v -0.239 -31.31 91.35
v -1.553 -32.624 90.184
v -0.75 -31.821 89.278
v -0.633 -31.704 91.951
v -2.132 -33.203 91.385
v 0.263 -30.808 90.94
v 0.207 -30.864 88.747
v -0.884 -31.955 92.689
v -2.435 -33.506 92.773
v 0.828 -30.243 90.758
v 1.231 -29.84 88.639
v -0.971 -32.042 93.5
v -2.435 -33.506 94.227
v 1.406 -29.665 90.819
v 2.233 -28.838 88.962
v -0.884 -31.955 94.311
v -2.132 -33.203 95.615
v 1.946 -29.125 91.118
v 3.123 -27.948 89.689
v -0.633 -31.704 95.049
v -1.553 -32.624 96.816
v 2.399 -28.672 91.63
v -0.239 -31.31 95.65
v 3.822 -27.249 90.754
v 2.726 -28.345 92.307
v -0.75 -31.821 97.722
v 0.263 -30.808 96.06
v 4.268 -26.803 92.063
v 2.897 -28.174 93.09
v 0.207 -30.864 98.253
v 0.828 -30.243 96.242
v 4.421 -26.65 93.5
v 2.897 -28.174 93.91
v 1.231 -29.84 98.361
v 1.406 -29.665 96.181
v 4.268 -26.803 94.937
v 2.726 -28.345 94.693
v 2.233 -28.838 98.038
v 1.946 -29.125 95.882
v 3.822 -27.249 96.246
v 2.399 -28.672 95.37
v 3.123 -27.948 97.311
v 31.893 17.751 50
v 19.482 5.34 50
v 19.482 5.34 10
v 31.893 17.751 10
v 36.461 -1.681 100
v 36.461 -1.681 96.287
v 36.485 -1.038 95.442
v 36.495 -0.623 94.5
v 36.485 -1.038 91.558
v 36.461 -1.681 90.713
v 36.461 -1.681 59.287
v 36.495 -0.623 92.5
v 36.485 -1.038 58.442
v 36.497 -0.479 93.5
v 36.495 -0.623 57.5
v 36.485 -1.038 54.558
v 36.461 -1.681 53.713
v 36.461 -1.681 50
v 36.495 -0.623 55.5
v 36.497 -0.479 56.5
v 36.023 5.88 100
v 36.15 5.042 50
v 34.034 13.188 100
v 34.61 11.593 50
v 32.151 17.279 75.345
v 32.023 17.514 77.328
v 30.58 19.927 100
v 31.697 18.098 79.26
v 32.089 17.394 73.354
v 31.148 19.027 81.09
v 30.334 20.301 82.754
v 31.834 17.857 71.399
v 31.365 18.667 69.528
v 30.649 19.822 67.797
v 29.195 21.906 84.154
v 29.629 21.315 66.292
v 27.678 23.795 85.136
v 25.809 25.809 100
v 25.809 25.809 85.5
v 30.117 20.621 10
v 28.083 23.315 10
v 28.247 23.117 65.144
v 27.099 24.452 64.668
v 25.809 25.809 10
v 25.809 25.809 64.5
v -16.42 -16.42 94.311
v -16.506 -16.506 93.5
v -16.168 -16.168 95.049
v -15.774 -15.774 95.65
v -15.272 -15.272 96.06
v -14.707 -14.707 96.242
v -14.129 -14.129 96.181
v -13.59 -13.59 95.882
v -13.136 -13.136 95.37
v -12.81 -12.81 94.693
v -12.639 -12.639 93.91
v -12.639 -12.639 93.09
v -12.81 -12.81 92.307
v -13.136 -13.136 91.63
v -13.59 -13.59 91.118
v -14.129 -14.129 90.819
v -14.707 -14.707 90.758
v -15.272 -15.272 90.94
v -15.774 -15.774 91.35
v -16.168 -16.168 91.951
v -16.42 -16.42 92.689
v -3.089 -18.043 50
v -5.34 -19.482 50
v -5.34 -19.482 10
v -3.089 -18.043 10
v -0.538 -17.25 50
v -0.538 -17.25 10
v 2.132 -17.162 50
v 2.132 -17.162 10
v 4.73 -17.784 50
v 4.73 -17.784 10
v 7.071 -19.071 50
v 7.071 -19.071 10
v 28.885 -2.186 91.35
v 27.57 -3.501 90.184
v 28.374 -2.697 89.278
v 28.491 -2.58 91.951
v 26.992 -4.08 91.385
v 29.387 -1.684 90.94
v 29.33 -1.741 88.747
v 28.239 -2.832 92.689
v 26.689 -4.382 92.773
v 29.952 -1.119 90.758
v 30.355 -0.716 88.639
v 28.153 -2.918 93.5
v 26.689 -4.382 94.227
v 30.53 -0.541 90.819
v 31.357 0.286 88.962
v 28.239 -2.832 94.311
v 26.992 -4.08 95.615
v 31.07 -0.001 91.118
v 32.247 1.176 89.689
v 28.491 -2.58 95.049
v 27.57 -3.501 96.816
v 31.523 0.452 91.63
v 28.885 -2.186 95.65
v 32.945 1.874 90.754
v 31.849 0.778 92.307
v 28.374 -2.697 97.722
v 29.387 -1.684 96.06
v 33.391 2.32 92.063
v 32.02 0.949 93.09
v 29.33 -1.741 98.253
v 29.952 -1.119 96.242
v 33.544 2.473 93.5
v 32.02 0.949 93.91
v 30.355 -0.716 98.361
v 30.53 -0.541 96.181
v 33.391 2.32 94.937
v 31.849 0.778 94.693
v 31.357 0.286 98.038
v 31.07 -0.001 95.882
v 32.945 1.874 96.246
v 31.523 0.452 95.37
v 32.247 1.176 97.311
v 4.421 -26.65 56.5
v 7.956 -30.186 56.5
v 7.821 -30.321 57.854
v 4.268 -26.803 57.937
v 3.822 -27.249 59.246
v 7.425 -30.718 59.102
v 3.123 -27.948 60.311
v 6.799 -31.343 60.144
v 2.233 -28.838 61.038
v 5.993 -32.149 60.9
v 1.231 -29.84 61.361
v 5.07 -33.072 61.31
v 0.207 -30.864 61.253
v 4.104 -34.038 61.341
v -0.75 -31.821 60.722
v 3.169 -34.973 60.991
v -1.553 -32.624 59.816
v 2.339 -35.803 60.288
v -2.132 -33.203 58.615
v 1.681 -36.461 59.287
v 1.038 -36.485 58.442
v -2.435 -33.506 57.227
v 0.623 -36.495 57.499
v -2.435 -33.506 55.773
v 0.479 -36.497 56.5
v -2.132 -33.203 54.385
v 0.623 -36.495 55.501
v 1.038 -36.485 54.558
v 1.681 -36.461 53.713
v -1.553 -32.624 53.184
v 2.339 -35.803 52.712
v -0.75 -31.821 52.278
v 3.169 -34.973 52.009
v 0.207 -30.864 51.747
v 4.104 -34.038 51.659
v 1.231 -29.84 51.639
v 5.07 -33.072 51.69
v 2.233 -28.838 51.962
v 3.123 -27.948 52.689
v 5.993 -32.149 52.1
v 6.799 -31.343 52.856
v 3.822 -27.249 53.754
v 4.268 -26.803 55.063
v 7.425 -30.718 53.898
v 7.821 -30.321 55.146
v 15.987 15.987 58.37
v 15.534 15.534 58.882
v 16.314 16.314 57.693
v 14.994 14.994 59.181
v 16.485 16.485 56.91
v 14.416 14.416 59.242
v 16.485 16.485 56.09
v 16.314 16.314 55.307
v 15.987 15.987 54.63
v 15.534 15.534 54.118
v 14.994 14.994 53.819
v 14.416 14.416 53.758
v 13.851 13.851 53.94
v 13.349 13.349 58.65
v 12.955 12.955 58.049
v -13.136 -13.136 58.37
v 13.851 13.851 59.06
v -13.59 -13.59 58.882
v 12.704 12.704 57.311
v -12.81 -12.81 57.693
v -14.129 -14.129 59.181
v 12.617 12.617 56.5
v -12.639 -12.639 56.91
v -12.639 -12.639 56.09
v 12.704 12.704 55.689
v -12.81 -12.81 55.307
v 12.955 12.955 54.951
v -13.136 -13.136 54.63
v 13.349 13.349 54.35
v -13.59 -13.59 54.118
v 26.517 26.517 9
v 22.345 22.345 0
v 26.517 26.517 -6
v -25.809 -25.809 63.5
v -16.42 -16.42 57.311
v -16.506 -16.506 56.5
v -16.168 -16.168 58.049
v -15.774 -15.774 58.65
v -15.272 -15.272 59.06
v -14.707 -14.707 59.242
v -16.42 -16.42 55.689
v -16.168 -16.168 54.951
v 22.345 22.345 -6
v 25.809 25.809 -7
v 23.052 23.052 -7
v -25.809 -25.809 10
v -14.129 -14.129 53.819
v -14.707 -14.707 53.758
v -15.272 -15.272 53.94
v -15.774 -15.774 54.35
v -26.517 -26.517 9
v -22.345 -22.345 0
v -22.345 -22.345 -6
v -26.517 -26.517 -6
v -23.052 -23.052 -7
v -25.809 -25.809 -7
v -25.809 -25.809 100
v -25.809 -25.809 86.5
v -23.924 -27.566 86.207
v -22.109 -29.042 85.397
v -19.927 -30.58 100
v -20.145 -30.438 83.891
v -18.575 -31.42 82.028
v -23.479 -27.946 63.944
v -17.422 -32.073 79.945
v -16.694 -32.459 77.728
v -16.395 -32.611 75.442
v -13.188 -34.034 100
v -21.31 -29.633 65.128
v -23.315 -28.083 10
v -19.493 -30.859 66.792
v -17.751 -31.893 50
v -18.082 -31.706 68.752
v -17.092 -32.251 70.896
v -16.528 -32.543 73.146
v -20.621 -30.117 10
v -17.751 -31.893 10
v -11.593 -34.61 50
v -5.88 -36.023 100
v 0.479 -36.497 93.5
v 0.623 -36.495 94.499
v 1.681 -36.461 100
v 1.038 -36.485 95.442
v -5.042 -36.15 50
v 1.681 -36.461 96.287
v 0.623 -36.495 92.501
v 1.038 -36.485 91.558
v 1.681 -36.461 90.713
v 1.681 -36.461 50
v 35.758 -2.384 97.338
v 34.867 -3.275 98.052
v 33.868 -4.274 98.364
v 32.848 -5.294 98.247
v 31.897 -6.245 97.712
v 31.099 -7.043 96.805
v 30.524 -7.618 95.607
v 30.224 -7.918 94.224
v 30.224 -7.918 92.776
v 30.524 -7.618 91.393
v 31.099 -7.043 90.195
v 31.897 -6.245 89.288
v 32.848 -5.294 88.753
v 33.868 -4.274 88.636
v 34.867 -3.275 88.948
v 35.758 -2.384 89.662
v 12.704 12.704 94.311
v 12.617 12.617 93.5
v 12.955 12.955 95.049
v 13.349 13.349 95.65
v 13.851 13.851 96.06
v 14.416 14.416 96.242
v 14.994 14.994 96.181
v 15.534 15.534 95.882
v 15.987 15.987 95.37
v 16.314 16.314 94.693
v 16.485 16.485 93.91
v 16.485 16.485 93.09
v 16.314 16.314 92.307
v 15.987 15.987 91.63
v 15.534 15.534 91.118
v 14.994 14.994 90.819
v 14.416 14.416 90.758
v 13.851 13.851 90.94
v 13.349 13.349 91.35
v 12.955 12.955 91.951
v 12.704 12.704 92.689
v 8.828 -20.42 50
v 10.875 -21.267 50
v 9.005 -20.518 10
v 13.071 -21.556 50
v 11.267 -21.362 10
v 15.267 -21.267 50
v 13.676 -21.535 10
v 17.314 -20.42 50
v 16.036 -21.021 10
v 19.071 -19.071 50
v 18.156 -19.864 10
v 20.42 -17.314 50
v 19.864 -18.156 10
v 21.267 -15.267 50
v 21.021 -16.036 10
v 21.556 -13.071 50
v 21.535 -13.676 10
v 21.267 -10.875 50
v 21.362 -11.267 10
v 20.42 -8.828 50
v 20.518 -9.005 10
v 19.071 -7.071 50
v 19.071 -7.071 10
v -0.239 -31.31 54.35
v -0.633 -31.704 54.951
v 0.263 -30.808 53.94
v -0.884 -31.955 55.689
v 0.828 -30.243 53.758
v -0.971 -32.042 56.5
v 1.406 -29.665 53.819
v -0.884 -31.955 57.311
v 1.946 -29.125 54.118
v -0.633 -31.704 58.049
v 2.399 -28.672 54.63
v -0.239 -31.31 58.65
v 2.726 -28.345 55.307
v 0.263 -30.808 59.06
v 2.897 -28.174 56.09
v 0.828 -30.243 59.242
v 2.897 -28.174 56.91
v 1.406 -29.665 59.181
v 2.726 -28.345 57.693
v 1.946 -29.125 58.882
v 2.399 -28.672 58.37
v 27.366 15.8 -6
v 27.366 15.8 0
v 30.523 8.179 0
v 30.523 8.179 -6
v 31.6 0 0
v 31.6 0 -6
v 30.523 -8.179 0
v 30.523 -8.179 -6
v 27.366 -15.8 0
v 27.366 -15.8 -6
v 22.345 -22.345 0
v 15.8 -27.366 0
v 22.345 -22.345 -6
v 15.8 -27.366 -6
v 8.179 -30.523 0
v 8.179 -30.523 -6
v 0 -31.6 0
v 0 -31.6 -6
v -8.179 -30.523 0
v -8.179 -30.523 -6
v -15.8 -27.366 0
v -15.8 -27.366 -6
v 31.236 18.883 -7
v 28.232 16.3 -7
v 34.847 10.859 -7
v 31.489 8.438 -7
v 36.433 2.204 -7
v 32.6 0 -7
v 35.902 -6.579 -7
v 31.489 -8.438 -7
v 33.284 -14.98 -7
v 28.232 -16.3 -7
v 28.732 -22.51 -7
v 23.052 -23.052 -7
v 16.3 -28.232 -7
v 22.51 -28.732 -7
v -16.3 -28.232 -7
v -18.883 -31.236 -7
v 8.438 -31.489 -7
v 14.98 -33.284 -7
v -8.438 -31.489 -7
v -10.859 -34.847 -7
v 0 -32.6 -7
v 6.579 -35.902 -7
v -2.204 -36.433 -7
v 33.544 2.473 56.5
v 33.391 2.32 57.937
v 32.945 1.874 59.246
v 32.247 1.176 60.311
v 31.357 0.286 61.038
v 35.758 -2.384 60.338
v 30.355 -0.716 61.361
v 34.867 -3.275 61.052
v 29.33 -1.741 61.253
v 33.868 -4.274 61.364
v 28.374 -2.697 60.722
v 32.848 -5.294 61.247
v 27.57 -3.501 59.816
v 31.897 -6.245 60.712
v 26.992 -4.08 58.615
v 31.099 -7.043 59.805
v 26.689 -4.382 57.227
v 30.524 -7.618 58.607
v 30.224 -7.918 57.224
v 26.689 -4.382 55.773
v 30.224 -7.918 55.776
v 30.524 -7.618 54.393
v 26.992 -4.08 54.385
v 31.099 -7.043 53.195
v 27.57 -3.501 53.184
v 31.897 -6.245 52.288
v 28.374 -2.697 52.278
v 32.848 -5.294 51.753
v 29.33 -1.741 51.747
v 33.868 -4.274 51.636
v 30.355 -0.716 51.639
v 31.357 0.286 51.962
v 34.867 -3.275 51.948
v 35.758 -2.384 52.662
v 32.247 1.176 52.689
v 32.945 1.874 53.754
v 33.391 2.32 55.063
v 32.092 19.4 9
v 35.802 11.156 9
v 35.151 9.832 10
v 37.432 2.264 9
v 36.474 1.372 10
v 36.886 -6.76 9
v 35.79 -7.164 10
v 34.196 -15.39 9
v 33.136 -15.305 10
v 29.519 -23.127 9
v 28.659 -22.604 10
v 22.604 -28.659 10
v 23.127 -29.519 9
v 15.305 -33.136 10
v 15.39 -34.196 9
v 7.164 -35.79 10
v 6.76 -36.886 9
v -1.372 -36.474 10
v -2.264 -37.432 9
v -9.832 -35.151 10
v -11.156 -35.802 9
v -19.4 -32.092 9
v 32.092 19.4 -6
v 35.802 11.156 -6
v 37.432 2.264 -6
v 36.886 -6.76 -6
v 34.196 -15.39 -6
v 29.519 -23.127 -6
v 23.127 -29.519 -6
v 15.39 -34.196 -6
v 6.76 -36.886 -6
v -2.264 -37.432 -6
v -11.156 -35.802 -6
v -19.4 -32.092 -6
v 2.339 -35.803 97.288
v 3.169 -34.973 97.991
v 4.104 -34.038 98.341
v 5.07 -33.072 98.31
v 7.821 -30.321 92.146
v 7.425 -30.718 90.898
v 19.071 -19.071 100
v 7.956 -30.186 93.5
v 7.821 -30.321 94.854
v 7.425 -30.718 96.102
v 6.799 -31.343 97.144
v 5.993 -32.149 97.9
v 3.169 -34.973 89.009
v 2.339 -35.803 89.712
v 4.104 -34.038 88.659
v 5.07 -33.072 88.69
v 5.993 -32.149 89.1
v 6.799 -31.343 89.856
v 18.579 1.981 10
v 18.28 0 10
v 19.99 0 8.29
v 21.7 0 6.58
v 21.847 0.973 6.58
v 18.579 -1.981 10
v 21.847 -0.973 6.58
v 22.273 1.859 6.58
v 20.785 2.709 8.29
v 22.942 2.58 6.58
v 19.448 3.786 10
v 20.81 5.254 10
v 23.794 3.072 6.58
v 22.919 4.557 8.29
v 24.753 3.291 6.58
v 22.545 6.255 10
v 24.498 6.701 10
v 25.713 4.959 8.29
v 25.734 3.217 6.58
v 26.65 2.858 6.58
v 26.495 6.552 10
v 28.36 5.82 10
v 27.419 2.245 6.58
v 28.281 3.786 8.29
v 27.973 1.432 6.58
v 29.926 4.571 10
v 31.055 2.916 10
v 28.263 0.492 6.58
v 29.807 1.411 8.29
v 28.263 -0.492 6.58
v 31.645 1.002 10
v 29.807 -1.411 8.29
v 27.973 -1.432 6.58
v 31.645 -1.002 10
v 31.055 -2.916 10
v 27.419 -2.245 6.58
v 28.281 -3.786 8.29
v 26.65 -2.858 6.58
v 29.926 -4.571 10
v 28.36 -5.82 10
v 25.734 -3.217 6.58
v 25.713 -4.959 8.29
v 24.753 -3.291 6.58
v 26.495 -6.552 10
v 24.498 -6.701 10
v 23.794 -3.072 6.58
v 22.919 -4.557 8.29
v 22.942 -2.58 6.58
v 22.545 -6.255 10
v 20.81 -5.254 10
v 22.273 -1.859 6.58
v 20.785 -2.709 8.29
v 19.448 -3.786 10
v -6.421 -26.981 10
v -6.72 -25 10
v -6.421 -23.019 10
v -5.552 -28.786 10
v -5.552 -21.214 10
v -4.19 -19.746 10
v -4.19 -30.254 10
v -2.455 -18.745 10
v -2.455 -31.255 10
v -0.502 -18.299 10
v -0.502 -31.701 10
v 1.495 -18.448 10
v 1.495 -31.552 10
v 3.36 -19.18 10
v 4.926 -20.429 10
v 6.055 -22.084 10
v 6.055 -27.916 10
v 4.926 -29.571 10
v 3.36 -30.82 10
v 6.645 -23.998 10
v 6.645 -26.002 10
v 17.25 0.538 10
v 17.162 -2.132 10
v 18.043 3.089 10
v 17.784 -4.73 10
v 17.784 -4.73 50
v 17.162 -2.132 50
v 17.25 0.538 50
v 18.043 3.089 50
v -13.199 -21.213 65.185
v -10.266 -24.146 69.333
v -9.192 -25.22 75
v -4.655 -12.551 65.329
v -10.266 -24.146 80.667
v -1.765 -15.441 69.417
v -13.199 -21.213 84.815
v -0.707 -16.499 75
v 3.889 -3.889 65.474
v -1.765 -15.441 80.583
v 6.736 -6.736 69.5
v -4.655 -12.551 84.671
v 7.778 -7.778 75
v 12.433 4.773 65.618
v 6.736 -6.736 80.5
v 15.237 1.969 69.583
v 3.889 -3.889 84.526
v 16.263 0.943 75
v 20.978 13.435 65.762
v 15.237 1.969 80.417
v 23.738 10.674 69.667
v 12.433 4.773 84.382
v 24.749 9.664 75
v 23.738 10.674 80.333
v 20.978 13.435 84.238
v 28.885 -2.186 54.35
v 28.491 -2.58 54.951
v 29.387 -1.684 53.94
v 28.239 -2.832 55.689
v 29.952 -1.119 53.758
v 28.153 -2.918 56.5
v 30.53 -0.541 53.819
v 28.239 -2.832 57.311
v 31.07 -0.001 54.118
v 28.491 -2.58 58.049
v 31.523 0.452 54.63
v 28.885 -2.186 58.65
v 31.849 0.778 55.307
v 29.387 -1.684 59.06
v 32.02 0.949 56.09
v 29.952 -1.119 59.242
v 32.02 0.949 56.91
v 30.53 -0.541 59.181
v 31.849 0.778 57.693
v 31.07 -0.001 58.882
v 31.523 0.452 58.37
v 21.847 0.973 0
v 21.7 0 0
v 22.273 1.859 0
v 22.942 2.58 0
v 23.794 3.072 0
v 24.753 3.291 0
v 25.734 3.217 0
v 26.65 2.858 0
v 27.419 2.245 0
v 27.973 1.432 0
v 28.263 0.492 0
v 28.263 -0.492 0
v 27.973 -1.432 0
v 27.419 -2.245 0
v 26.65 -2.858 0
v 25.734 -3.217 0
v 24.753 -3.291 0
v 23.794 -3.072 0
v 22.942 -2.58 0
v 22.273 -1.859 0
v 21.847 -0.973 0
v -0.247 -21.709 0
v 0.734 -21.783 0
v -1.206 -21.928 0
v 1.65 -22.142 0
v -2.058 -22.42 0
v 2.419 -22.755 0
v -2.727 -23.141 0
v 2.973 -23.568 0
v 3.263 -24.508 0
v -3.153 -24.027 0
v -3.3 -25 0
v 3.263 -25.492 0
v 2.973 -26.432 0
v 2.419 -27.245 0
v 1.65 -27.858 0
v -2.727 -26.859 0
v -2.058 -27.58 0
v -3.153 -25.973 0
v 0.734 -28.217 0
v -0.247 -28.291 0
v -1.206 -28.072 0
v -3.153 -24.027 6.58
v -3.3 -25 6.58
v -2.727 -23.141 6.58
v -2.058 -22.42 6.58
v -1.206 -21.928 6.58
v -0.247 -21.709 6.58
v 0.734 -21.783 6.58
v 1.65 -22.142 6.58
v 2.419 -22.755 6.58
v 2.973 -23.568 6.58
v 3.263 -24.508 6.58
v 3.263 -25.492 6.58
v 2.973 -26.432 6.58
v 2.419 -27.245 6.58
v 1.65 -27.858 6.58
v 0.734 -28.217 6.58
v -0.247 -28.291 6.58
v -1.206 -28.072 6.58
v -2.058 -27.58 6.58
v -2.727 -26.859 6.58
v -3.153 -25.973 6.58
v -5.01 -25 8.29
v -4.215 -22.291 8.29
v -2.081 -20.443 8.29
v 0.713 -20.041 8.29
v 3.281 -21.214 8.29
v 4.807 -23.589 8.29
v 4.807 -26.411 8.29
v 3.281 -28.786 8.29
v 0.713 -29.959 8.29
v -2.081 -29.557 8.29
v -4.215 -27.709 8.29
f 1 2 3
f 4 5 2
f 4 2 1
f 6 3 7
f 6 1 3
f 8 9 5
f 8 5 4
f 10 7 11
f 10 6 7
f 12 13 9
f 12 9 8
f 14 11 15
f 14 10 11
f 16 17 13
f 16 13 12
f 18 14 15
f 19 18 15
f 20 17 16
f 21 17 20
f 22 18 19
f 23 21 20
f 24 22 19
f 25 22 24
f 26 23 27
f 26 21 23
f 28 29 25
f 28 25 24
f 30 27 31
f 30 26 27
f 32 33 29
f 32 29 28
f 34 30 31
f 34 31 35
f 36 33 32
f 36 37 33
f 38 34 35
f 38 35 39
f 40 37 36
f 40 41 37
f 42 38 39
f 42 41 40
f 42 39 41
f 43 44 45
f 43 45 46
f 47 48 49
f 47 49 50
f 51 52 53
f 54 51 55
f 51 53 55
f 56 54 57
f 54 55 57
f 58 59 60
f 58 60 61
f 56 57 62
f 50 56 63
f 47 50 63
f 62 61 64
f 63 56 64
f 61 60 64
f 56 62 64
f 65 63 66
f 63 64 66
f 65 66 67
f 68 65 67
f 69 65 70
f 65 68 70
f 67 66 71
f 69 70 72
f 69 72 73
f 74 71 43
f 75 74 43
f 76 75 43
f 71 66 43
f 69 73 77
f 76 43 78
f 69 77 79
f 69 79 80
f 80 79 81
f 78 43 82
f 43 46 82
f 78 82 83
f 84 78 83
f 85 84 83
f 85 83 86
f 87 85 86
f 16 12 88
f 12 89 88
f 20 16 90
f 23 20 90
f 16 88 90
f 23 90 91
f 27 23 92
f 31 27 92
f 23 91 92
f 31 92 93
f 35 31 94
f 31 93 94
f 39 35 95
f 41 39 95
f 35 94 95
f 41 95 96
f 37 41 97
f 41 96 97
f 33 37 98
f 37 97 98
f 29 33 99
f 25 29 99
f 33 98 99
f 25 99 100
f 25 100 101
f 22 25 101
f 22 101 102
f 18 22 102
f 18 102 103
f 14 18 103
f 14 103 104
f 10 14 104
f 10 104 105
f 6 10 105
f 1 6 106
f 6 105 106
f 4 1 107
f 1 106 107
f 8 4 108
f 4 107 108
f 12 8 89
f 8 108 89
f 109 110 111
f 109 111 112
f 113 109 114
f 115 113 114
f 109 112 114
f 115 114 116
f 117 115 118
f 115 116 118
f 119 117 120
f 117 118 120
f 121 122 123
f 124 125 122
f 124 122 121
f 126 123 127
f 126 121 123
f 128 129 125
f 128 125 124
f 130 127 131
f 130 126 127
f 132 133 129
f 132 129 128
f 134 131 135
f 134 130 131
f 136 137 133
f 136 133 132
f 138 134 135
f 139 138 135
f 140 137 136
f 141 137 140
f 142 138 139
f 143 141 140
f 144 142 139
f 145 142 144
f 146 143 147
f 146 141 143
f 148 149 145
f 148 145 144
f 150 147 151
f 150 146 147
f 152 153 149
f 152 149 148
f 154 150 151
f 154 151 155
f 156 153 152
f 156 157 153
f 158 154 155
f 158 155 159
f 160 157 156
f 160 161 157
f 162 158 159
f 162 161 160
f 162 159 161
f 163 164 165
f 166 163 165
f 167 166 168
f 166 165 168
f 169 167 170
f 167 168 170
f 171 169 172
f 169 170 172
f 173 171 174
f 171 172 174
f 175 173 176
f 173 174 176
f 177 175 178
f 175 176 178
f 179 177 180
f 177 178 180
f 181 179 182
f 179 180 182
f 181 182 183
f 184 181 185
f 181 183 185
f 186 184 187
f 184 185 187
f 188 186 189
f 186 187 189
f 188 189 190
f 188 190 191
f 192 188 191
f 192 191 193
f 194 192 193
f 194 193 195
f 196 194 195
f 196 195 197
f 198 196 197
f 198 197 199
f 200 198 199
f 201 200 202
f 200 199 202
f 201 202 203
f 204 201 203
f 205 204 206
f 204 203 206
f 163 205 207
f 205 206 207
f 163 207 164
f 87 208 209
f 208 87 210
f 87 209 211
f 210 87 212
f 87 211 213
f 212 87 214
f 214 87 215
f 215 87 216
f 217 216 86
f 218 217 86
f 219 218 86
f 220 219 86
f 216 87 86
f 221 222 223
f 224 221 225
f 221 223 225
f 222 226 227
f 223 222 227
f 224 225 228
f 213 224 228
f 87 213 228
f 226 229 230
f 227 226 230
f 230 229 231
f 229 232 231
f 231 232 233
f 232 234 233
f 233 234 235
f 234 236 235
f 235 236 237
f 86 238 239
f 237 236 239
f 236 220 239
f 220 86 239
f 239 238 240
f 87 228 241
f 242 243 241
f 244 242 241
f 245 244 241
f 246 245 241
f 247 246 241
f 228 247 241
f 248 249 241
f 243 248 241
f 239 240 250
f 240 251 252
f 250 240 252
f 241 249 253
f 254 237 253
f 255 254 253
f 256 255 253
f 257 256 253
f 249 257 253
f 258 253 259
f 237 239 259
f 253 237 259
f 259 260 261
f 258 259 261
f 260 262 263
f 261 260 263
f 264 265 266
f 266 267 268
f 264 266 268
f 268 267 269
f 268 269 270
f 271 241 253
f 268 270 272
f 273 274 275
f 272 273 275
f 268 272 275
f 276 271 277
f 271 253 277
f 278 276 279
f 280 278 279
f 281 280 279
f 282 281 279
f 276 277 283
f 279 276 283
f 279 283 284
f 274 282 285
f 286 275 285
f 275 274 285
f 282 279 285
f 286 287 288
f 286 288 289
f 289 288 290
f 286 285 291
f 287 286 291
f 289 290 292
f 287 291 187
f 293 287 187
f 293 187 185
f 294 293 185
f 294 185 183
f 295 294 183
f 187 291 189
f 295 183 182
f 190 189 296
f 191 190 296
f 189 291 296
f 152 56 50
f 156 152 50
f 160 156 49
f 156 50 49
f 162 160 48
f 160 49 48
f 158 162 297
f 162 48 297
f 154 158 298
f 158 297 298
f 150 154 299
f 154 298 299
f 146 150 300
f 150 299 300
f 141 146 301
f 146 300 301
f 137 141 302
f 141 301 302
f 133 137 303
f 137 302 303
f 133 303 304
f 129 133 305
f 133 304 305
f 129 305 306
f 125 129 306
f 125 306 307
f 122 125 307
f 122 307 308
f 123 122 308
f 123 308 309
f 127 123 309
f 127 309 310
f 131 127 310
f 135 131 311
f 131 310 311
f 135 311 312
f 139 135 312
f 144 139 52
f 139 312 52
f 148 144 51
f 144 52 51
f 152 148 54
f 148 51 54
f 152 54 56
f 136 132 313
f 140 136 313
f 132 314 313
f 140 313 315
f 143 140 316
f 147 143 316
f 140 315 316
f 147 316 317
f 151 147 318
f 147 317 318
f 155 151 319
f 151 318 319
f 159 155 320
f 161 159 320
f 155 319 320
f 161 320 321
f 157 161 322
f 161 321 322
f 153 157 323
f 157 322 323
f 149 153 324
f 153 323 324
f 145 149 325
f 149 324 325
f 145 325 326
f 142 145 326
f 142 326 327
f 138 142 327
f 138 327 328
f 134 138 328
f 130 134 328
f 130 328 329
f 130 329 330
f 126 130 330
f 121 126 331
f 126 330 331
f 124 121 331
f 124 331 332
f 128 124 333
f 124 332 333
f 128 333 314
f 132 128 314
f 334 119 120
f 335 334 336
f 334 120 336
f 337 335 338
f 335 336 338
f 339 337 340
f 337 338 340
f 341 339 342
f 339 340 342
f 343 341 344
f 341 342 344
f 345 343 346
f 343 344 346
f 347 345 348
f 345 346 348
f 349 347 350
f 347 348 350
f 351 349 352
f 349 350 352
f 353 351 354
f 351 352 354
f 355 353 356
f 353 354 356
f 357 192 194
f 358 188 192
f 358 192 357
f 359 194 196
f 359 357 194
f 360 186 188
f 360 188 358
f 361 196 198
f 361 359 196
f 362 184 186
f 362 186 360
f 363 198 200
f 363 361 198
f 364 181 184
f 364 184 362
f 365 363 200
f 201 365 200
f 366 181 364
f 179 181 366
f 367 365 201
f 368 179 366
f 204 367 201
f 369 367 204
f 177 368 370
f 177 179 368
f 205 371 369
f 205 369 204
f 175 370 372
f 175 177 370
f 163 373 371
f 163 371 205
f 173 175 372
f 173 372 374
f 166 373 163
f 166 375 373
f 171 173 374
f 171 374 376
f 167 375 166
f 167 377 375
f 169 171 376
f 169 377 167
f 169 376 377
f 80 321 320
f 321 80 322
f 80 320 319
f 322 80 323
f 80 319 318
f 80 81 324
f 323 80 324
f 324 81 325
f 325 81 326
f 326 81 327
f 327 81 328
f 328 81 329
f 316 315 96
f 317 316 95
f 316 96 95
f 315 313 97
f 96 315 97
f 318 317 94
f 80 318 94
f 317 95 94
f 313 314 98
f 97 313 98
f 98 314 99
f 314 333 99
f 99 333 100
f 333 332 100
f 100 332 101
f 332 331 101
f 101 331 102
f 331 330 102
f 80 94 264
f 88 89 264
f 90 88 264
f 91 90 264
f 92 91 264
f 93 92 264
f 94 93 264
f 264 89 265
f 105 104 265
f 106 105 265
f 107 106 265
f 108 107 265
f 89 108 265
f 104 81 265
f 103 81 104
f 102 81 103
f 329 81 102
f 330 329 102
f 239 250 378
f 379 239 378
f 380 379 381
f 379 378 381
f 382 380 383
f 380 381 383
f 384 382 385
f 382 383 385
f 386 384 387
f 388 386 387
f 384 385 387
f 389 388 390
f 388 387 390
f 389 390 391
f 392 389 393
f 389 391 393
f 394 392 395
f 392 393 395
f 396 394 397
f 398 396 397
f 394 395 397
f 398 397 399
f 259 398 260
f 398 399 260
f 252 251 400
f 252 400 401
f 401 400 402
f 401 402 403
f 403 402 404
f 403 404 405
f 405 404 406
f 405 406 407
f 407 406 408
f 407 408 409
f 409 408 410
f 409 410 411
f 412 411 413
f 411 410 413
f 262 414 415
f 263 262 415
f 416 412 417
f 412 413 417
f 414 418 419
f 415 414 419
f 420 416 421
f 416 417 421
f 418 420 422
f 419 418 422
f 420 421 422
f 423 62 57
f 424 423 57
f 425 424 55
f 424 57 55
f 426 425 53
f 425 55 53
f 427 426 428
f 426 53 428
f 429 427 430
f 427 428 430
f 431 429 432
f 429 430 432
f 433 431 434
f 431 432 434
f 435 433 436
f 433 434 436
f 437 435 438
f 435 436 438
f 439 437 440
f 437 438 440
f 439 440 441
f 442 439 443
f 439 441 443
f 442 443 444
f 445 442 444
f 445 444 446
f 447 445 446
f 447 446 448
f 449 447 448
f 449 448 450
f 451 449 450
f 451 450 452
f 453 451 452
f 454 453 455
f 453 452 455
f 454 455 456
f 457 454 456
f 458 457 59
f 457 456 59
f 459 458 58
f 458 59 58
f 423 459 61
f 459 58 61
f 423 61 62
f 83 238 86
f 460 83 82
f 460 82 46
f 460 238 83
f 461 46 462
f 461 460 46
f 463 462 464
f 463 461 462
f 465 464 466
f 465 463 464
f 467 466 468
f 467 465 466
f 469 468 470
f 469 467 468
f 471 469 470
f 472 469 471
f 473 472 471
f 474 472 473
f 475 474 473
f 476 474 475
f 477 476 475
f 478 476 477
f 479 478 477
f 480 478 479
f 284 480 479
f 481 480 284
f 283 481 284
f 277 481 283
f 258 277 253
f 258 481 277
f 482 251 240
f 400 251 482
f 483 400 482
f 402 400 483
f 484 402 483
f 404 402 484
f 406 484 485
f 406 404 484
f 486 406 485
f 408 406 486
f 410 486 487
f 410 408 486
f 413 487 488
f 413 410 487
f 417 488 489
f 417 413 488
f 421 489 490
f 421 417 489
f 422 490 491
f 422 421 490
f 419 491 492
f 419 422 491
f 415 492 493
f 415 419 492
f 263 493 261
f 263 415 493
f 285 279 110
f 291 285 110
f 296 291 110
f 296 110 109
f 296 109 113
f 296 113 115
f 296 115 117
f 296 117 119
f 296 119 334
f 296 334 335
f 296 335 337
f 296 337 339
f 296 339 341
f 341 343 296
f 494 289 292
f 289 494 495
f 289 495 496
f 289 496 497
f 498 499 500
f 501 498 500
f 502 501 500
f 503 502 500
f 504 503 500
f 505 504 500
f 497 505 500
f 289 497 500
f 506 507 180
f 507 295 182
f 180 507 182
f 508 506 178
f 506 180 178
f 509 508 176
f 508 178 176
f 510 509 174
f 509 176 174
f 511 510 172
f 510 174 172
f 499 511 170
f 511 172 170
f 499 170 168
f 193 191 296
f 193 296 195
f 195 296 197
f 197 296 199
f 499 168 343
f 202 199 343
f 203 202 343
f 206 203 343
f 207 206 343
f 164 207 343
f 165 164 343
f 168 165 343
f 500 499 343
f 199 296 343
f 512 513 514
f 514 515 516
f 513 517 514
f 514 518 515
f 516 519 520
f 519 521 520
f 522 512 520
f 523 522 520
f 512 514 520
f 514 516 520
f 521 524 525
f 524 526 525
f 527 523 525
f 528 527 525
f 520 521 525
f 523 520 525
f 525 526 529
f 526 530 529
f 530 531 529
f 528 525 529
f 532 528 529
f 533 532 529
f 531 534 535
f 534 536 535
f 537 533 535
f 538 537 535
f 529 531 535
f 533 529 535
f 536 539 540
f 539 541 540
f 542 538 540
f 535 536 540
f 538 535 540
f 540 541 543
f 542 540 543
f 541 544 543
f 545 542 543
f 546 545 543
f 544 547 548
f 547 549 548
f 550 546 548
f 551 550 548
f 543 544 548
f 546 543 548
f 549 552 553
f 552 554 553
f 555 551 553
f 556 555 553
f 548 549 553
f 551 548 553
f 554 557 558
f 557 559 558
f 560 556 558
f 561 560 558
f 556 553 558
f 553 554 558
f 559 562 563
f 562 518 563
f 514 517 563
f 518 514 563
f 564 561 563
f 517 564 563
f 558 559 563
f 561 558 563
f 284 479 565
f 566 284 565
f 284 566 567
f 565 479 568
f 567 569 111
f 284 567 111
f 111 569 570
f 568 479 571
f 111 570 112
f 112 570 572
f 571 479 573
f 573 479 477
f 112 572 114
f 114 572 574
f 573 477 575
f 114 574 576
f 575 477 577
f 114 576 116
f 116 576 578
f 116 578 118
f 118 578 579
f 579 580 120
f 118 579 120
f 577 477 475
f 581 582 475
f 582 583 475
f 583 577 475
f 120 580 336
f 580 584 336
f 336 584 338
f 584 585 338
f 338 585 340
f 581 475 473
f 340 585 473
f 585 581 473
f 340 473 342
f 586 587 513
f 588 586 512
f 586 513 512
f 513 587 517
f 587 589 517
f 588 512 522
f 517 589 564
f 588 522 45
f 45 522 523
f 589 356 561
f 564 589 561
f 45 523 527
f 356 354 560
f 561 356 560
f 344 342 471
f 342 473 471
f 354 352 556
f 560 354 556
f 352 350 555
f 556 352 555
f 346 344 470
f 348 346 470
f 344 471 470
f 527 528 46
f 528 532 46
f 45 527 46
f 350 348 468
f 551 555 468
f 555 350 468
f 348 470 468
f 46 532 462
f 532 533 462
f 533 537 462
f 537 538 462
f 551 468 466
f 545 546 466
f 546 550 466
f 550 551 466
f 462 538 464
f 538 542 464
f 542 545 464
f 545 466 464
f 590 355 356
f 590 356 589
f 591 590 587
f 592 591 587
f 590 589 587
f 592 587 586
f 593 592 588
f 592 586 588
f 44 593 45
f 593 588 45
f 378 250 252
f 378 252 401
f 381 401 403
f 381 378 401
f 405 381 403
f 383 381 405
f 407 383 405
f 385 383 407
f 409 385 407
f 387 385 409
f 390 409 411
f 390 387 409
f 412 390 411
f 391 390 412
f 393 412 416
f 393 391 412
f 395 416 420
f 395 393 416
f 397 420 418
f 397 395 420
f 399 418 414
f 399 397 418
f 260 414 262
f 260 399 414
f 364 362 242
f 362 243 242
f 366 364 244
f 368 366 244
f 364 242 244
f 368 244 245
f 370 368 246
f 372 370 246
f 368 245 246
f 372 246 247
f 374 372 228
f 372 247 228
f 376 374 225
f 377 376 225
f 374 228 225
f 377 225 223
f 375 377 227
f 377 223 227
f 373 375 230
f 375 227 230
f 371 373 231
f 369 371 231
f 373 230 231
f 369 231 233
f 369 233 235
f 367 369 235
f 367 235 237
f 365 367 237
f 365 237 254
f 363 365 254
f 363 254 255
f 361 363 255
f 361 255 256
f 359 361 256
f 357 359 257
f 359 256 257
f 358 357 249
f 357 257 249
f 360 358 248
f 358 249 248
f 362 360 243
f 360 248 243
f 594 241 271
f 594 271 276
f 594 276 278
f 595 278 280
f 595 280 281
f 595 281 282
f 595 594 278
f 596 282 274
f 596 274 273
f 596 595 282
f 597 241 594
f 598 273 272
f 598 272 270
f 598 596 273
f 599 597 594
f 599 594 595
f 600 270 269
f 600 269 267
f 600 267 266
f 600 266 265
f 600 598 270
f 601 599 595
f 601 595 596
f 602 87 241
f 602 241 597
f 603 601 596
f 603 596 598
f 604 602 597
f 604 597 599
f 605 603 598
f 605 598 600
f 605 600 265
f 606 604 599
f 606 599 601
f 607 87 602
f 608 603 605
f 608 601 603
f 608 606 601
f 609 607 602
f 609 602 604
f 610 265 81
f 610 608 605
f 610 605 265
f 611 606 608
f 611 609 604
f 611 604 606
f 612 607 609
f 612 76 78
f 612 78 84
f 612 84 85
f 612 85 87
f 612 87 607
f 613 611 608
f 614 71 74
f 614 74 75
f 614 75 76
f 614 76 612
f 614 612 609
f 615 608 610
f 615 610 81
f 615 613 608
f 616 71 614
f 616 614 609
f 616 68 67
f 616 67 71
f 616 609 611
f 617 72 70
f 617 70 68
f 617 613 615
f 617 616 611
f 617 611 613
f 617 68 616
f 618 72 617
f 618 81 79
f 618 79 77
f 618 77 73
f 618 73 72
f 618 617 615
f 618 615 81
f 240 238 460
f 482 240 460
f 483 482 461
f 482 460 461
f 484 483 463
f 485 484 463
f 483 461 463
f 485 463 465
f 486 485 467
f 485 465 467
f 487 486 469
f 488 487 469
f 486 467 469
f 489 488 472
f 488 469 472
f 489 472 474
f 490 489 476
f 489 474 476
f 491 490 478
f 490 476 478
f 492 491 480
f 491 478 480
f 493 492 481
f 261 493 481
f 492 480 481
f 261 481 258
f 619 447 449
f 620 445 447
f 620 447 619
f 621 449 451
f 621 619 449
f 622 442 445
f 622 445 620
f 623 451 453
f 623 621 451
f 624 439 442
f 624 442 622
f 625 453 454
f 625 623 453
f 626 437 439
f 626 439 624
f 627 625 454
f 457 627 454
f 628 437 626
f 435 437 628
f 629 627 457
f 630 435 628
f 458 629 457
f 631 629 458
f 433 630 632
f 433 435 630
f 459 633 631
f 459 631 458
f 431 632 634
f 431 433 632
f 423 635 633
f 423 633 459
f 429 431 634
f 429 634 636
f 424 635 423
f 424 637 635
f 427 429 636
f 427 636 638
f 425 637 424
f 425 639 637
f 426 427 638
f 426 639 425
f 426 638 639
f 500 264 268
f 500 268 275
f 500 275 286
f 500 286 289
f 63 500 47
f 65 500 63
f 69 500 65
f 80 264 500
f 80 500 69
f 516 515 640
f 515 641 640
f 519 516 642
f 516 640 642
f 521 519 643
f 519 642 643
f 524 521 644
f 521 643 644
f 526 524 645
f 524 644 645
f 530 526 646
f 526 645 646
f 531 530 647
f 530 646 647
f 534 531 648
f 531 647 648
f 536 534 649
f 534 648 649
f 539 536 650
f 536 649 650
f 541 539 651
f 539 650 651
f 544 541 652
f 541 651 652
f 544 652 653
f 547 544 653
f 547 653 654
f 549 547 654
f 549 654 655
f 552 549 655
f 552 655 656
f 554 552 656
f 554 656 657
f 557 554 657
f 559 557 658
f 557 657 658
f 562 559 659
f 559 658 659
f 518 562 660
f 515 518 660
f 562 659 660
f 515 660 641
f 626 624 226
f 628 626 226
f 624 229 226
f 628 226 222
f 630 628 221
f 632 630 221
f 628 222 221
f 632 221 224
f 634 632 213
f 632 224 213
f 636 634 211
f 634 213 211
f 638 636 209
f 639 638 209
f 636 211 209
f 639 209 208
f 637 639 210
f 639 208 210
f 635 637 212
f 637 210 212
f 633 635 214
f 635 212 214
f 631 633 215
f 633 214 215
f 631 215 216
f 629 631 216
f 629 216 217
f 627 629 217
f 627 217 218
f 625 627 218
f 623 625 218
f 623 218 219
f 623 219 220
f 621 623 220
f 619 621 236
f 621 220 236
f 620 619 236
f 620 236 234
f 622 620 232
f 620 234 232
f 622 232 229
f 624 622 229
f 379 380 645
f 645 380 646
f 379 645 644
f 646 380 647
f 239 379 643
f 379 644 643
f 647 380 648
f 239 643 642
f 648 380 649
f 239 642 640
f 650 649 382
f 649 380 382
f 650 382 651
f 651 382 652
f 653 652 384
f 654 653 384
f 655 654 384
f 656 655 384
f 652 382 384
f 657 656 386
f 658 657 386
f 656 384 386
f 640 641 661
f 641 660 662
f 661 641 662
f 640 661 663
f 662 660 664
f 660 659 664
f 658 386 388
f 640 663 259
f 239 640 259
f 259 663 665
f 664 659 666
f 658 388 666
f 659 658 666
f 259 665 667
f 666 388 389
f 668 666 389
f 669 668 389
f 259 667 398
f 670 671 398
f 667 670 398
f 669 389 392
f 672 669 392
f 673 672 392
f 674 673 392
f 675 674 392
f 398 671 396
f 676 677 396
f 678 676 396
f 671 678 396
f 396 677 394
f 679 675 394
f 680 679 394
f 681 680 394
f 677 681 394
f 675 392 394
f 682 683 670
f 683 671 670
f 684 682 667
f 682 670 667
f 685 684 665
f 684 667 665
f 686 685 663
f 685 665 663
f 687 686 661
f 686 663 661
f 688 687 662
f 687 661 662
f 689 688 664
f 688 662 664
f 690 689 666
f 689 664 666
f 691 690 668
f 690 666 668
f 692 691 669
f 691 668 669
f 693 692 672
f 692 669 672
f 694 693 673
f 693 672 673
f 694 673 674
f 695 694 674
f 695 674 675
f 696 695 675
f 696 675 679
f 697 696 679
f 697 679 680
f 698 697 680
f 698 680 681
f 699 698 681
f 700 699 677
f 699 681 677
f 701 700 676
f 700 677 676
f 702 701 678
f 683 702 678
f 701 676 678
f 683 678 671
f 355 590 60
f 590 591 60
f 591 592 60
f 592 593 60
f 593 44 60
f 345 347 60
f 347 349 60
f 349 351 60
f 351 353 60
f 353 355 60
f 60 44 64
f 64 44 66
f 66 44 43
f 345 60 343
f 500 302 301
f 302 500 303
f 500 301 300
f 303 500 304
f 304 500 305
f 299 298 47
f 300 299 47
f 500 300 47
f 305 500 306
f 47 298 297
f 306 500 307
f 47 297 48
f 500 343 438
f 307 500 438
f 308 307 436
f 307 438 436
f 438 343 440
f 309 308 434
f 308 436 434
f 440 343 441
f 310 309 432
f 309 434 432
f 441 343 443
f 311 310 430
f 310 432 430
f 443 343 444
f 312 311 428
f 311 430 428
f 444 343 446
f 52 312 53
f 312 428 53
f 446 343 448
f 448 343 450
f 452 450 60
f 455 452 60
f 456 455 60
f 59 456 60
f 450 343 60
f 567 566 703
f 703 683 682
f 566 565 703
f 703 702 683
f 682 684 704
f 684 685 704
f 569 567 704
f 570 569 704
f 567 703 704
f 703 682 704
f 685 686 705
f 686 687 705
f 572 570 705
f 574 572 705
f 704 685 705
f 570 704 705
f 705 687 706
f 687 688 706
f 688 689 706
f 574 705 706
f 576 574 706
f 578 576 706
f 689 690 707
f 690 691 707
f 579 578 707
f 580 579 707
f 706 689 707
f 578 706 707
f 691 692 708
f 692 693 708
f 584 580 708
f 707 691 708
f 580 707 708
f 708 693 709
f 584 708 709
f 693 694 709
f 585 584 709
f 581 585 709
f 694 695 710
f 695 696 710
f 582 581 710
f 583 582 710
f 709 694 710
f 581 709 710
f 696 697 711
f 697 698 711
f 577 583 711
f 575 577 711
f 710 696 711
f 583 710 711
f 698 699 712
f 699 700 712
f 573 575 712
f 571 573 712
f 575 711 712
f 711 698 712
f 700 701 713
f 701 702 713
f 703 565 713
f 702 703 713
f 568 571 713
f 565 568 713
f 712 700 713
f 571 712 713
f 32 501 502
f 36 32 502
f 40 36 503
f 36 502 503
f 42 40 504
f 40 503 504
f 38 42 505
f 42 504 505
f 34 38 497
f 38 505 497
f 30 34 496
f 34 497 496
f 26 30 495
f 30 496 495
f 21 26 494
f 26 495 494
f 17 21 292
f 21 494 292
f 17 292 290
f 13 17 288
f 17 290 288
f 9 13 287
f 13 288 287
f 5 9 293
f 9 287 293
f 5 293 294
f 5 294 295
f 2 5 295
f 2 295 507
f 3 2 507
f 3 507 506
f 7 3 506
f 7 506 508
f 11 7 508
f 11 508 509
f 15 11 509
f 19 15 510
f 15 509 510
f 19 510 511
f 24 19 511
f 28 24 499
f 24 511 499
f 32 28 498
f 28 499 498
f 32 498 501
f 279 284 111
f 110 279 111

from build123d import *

# Parameters (mm, degrees)
F1_ANGLE_BACK   = 45
F1_ANGLE        = 180
F2_SIZE         = 1
F4_D            = 6.6
F4_CSINK_D      = 13.44
F4_CSINK_ANGLE  = 90
F6_DEPTH        = 40
F8_DEPTH        = 50
F12_D           = 5.5
F12_CBORE_D     = 9.75
F12_CBORE_DEPTH = 5


# Not quite as in the source:
# - a feature names something its author has since deleted; it is built from what else it names


with BuildPart() as f1:
    # F0 (on Front) → F1 (revolve)
    with BuildSketch(Plane.XZ, mode=Mode.PRIVATE) as f1_sk:
        Polygon((0, 10), (0, 0), (31.6, 0), (31.6, -7), (37.5, -7), (37.5, 10), align=None)
    revolve(f1_sk.sketch.rotate(Axis((0, 0, 5), (0, 0, -1)), -F1_ANGLE_BACK), axis=Axis((0, 0, 5), (0, 0, -1)), revolution_arc=F1_ANGLE)

    # F2
    f2_edges = [f1.edges().sort_by_distance(p)[0] for p in [
        (22.344574, -22.344574, -7),
        (26.516504, -26.516504, -7),
        (26.516504, -26.516504, 10),
    ]]
    chamfer(f2_edges, length=F2_SIZE)

    # F4 (through all)
    with Locations(Plane.XY.offset(10)):
        with Locations((25, 0), (0, -25)):
            CounterSinkHole(F4_D / 2, F4_CSINK_D / 2, counter_sink_angle=F4_CSINK_ANGLE)

    # F5 (on face) → F6 (join)
    with BuildSketch(Plane.XY.offset(10)):
        with BuildLine():
            Line((19.4820004924, 5.3398648686), (7.0710678119, -7.0710678119))
            Line((7.0710678119, -7.0710678119), (-5.3398648686, -19.4820004924))
            ThreePointArc((-5.3398648686, -19.4820004924), (0.79408889, -17.1167209324), (7.0710678119, -19.0710678119))
            ThreePointArc((7.0710678119, -19.0710678119), (19.0710678119, -19.0710678119), (19.0710678119, -7.0710678119))
            ThreePointArc((19.0710678119, -7.0710678119), (17.1167209324, -0.79408889), (19.4820004924, 5.3398648686))
        make_face()
        with BuildLine():
            Line((7.0710678119, -7.0710678119), (0, 0))
            Line((0, 0), (-25.8093975133, -25.8093975133))
            ThreePointArc((-25.8093975133, -25.8093975133), (-21.9914756212, -29.1311688746), (-17.7507975491, -31.8929331729))
            Line((-17.7507975491, -31.8929331729), (-5.3398648686, -19.4820004924))
            Line((-5.3398648686, -19.4820004924), (7.0710678119, -7.0710678119))
        make_face()
        with BuildLine():
            Line((25.8093975133, 25.8093975133), (0, 0))
            Line((0, 0), (7.0710678119, -7.0710678119))
            Line((7.0710678119, -7.0710678119), (19.4820004924, 5.3398648686))
            Line((19.4820004924, 5.3398648686), (31.8929331729, 17.7507975491))
            ThreePointArc((31.8929331729, 17.7507975491), (29.1311688746, 21.9914756212), (25.8093975133, 25.8093975133))
        make_face()
    extrude(amount=F6_DEPTH)

    # F7 (on face) → F8 (join)
    with BuildSketch(Plane.XY.offset(50)):
        with BuildLine():
            ThreePointArc((36.4612769111, -1.6808587126), (35.531279534, 8.3533331479), (31.8929331729, 17.7507975491))
            Line((31.8929331729, 17.7507975491), (19.4820004924, 5.3398648686))
            ThreePointArc((19.4820004924, 5.3398648686), (17.1167209324, -0.79408889), (19.0710678119, -7.0710678119))
            ThreePointArc((19.0710678119, -7.0710678119), (21.5563491861, -13.0710678119), (19.0710678119, -19.0710678119))
            Line((19.0710678119, -19.0710678119), (36.4612769111, -1.6808587126))
        make_face()
        with BuildLine():
            Line((-5.3398648686, -19.4820004924), (-17.7507975491, -31.8929331729))
            ThreePointArc((-17.7507975491, -31.8929331729), (-8.3533331479, -35.531279534), (1.6808587126, -36.4612769111))
            Line((1.6808587126, -36.4612769111), (19.0710678119, -19.0710678119))
            ThreePointArc((19.0710678119, -19.0710678119), (13.0710678119, -21.5563491861), (7.0710678119, -19.0710678119))
            ThreePointArc((7.0710678119, -19.0710678119), (0.79408889, -17.1167209324), (-5.3398648686, -19.4820004924))
        make_face()
        with BuildLine():
            ThreePointArc((31.8929331729, 17.7507975491), (29.1311688746, 21.9914756212), (25.8093975133, 25.8093975133))
            Line((25.8093975133, 25.8093975133), (-25.8093975133, -25.8093975133))
            ThreePointArc((-25.8093975133, -25.8093975133), (-21.9914756212, -29.1311688746), (-17.7507975491, -31.8929331729))
            Line((-17.7507975491, -31.8929331729), (-5.3398648686, -19.4820004924))
            ThreePointArc((-5.3398648686, -19.4820004924), (0.79408889, -17.1167209324), (7.0710678119, -19.0710678119))
            ThreePointArc((7.0710678119, -19.0710678119), (13.0710678119, -21.5563491861), (19.0710678119, -19.0710678119))
            ThreePointArc((19.0710678119, -19.0710678119), (21.5563491861, -13.0710678119), (19.0710678119, -7.0710678119))
            ThreePointArc((19.0710678119, -7.0710678119), (17.1167209324, -0.79408889), (19.4820004924, 5.3398648686))
            Line((19.4820004924, 5.3398648686), (31.8929331729, 17.7507975491))
        make_face()
    extrude(amount=F8_DEPTH)

    # F9 (on face) → F10 (revolve, cut)
    with BuildSketch(Plane(origin=(0, 0, 0), x_dir=(-0.7071067812, -0.7071067812, 0), z_dir=(-0.7071067812, 0.7071067812, 0))):
        Polygon((36.5, 86.5), (-36.5, 85.5), (-36.5, 75), (36.5, 75), align=None)
    revolve(axis=Axis((0, 0, 75), (-0.7071067812, -0.7071067812, 0)), mode=Mode.SUBTRACT)

    # F12 (through all)
    with Locations(Plane(origin=(19.0710678119, -19.0710678119, 0), x_dir=(0.7071067812, 0.7071067812, 0), z_dir=(0.7071067812, -0.7071067812, 0))):
        with Locations((20.5934695606, 93.5), (20.5934695606, 56.5), (-20.5934695606, 56.5), (-20.5934695606, 93.5)):
            CounterBoreHole(F12_D / 2, F12_CBORE_D / 2, F12_CBORE_DEPTH)


solid = f1.part
